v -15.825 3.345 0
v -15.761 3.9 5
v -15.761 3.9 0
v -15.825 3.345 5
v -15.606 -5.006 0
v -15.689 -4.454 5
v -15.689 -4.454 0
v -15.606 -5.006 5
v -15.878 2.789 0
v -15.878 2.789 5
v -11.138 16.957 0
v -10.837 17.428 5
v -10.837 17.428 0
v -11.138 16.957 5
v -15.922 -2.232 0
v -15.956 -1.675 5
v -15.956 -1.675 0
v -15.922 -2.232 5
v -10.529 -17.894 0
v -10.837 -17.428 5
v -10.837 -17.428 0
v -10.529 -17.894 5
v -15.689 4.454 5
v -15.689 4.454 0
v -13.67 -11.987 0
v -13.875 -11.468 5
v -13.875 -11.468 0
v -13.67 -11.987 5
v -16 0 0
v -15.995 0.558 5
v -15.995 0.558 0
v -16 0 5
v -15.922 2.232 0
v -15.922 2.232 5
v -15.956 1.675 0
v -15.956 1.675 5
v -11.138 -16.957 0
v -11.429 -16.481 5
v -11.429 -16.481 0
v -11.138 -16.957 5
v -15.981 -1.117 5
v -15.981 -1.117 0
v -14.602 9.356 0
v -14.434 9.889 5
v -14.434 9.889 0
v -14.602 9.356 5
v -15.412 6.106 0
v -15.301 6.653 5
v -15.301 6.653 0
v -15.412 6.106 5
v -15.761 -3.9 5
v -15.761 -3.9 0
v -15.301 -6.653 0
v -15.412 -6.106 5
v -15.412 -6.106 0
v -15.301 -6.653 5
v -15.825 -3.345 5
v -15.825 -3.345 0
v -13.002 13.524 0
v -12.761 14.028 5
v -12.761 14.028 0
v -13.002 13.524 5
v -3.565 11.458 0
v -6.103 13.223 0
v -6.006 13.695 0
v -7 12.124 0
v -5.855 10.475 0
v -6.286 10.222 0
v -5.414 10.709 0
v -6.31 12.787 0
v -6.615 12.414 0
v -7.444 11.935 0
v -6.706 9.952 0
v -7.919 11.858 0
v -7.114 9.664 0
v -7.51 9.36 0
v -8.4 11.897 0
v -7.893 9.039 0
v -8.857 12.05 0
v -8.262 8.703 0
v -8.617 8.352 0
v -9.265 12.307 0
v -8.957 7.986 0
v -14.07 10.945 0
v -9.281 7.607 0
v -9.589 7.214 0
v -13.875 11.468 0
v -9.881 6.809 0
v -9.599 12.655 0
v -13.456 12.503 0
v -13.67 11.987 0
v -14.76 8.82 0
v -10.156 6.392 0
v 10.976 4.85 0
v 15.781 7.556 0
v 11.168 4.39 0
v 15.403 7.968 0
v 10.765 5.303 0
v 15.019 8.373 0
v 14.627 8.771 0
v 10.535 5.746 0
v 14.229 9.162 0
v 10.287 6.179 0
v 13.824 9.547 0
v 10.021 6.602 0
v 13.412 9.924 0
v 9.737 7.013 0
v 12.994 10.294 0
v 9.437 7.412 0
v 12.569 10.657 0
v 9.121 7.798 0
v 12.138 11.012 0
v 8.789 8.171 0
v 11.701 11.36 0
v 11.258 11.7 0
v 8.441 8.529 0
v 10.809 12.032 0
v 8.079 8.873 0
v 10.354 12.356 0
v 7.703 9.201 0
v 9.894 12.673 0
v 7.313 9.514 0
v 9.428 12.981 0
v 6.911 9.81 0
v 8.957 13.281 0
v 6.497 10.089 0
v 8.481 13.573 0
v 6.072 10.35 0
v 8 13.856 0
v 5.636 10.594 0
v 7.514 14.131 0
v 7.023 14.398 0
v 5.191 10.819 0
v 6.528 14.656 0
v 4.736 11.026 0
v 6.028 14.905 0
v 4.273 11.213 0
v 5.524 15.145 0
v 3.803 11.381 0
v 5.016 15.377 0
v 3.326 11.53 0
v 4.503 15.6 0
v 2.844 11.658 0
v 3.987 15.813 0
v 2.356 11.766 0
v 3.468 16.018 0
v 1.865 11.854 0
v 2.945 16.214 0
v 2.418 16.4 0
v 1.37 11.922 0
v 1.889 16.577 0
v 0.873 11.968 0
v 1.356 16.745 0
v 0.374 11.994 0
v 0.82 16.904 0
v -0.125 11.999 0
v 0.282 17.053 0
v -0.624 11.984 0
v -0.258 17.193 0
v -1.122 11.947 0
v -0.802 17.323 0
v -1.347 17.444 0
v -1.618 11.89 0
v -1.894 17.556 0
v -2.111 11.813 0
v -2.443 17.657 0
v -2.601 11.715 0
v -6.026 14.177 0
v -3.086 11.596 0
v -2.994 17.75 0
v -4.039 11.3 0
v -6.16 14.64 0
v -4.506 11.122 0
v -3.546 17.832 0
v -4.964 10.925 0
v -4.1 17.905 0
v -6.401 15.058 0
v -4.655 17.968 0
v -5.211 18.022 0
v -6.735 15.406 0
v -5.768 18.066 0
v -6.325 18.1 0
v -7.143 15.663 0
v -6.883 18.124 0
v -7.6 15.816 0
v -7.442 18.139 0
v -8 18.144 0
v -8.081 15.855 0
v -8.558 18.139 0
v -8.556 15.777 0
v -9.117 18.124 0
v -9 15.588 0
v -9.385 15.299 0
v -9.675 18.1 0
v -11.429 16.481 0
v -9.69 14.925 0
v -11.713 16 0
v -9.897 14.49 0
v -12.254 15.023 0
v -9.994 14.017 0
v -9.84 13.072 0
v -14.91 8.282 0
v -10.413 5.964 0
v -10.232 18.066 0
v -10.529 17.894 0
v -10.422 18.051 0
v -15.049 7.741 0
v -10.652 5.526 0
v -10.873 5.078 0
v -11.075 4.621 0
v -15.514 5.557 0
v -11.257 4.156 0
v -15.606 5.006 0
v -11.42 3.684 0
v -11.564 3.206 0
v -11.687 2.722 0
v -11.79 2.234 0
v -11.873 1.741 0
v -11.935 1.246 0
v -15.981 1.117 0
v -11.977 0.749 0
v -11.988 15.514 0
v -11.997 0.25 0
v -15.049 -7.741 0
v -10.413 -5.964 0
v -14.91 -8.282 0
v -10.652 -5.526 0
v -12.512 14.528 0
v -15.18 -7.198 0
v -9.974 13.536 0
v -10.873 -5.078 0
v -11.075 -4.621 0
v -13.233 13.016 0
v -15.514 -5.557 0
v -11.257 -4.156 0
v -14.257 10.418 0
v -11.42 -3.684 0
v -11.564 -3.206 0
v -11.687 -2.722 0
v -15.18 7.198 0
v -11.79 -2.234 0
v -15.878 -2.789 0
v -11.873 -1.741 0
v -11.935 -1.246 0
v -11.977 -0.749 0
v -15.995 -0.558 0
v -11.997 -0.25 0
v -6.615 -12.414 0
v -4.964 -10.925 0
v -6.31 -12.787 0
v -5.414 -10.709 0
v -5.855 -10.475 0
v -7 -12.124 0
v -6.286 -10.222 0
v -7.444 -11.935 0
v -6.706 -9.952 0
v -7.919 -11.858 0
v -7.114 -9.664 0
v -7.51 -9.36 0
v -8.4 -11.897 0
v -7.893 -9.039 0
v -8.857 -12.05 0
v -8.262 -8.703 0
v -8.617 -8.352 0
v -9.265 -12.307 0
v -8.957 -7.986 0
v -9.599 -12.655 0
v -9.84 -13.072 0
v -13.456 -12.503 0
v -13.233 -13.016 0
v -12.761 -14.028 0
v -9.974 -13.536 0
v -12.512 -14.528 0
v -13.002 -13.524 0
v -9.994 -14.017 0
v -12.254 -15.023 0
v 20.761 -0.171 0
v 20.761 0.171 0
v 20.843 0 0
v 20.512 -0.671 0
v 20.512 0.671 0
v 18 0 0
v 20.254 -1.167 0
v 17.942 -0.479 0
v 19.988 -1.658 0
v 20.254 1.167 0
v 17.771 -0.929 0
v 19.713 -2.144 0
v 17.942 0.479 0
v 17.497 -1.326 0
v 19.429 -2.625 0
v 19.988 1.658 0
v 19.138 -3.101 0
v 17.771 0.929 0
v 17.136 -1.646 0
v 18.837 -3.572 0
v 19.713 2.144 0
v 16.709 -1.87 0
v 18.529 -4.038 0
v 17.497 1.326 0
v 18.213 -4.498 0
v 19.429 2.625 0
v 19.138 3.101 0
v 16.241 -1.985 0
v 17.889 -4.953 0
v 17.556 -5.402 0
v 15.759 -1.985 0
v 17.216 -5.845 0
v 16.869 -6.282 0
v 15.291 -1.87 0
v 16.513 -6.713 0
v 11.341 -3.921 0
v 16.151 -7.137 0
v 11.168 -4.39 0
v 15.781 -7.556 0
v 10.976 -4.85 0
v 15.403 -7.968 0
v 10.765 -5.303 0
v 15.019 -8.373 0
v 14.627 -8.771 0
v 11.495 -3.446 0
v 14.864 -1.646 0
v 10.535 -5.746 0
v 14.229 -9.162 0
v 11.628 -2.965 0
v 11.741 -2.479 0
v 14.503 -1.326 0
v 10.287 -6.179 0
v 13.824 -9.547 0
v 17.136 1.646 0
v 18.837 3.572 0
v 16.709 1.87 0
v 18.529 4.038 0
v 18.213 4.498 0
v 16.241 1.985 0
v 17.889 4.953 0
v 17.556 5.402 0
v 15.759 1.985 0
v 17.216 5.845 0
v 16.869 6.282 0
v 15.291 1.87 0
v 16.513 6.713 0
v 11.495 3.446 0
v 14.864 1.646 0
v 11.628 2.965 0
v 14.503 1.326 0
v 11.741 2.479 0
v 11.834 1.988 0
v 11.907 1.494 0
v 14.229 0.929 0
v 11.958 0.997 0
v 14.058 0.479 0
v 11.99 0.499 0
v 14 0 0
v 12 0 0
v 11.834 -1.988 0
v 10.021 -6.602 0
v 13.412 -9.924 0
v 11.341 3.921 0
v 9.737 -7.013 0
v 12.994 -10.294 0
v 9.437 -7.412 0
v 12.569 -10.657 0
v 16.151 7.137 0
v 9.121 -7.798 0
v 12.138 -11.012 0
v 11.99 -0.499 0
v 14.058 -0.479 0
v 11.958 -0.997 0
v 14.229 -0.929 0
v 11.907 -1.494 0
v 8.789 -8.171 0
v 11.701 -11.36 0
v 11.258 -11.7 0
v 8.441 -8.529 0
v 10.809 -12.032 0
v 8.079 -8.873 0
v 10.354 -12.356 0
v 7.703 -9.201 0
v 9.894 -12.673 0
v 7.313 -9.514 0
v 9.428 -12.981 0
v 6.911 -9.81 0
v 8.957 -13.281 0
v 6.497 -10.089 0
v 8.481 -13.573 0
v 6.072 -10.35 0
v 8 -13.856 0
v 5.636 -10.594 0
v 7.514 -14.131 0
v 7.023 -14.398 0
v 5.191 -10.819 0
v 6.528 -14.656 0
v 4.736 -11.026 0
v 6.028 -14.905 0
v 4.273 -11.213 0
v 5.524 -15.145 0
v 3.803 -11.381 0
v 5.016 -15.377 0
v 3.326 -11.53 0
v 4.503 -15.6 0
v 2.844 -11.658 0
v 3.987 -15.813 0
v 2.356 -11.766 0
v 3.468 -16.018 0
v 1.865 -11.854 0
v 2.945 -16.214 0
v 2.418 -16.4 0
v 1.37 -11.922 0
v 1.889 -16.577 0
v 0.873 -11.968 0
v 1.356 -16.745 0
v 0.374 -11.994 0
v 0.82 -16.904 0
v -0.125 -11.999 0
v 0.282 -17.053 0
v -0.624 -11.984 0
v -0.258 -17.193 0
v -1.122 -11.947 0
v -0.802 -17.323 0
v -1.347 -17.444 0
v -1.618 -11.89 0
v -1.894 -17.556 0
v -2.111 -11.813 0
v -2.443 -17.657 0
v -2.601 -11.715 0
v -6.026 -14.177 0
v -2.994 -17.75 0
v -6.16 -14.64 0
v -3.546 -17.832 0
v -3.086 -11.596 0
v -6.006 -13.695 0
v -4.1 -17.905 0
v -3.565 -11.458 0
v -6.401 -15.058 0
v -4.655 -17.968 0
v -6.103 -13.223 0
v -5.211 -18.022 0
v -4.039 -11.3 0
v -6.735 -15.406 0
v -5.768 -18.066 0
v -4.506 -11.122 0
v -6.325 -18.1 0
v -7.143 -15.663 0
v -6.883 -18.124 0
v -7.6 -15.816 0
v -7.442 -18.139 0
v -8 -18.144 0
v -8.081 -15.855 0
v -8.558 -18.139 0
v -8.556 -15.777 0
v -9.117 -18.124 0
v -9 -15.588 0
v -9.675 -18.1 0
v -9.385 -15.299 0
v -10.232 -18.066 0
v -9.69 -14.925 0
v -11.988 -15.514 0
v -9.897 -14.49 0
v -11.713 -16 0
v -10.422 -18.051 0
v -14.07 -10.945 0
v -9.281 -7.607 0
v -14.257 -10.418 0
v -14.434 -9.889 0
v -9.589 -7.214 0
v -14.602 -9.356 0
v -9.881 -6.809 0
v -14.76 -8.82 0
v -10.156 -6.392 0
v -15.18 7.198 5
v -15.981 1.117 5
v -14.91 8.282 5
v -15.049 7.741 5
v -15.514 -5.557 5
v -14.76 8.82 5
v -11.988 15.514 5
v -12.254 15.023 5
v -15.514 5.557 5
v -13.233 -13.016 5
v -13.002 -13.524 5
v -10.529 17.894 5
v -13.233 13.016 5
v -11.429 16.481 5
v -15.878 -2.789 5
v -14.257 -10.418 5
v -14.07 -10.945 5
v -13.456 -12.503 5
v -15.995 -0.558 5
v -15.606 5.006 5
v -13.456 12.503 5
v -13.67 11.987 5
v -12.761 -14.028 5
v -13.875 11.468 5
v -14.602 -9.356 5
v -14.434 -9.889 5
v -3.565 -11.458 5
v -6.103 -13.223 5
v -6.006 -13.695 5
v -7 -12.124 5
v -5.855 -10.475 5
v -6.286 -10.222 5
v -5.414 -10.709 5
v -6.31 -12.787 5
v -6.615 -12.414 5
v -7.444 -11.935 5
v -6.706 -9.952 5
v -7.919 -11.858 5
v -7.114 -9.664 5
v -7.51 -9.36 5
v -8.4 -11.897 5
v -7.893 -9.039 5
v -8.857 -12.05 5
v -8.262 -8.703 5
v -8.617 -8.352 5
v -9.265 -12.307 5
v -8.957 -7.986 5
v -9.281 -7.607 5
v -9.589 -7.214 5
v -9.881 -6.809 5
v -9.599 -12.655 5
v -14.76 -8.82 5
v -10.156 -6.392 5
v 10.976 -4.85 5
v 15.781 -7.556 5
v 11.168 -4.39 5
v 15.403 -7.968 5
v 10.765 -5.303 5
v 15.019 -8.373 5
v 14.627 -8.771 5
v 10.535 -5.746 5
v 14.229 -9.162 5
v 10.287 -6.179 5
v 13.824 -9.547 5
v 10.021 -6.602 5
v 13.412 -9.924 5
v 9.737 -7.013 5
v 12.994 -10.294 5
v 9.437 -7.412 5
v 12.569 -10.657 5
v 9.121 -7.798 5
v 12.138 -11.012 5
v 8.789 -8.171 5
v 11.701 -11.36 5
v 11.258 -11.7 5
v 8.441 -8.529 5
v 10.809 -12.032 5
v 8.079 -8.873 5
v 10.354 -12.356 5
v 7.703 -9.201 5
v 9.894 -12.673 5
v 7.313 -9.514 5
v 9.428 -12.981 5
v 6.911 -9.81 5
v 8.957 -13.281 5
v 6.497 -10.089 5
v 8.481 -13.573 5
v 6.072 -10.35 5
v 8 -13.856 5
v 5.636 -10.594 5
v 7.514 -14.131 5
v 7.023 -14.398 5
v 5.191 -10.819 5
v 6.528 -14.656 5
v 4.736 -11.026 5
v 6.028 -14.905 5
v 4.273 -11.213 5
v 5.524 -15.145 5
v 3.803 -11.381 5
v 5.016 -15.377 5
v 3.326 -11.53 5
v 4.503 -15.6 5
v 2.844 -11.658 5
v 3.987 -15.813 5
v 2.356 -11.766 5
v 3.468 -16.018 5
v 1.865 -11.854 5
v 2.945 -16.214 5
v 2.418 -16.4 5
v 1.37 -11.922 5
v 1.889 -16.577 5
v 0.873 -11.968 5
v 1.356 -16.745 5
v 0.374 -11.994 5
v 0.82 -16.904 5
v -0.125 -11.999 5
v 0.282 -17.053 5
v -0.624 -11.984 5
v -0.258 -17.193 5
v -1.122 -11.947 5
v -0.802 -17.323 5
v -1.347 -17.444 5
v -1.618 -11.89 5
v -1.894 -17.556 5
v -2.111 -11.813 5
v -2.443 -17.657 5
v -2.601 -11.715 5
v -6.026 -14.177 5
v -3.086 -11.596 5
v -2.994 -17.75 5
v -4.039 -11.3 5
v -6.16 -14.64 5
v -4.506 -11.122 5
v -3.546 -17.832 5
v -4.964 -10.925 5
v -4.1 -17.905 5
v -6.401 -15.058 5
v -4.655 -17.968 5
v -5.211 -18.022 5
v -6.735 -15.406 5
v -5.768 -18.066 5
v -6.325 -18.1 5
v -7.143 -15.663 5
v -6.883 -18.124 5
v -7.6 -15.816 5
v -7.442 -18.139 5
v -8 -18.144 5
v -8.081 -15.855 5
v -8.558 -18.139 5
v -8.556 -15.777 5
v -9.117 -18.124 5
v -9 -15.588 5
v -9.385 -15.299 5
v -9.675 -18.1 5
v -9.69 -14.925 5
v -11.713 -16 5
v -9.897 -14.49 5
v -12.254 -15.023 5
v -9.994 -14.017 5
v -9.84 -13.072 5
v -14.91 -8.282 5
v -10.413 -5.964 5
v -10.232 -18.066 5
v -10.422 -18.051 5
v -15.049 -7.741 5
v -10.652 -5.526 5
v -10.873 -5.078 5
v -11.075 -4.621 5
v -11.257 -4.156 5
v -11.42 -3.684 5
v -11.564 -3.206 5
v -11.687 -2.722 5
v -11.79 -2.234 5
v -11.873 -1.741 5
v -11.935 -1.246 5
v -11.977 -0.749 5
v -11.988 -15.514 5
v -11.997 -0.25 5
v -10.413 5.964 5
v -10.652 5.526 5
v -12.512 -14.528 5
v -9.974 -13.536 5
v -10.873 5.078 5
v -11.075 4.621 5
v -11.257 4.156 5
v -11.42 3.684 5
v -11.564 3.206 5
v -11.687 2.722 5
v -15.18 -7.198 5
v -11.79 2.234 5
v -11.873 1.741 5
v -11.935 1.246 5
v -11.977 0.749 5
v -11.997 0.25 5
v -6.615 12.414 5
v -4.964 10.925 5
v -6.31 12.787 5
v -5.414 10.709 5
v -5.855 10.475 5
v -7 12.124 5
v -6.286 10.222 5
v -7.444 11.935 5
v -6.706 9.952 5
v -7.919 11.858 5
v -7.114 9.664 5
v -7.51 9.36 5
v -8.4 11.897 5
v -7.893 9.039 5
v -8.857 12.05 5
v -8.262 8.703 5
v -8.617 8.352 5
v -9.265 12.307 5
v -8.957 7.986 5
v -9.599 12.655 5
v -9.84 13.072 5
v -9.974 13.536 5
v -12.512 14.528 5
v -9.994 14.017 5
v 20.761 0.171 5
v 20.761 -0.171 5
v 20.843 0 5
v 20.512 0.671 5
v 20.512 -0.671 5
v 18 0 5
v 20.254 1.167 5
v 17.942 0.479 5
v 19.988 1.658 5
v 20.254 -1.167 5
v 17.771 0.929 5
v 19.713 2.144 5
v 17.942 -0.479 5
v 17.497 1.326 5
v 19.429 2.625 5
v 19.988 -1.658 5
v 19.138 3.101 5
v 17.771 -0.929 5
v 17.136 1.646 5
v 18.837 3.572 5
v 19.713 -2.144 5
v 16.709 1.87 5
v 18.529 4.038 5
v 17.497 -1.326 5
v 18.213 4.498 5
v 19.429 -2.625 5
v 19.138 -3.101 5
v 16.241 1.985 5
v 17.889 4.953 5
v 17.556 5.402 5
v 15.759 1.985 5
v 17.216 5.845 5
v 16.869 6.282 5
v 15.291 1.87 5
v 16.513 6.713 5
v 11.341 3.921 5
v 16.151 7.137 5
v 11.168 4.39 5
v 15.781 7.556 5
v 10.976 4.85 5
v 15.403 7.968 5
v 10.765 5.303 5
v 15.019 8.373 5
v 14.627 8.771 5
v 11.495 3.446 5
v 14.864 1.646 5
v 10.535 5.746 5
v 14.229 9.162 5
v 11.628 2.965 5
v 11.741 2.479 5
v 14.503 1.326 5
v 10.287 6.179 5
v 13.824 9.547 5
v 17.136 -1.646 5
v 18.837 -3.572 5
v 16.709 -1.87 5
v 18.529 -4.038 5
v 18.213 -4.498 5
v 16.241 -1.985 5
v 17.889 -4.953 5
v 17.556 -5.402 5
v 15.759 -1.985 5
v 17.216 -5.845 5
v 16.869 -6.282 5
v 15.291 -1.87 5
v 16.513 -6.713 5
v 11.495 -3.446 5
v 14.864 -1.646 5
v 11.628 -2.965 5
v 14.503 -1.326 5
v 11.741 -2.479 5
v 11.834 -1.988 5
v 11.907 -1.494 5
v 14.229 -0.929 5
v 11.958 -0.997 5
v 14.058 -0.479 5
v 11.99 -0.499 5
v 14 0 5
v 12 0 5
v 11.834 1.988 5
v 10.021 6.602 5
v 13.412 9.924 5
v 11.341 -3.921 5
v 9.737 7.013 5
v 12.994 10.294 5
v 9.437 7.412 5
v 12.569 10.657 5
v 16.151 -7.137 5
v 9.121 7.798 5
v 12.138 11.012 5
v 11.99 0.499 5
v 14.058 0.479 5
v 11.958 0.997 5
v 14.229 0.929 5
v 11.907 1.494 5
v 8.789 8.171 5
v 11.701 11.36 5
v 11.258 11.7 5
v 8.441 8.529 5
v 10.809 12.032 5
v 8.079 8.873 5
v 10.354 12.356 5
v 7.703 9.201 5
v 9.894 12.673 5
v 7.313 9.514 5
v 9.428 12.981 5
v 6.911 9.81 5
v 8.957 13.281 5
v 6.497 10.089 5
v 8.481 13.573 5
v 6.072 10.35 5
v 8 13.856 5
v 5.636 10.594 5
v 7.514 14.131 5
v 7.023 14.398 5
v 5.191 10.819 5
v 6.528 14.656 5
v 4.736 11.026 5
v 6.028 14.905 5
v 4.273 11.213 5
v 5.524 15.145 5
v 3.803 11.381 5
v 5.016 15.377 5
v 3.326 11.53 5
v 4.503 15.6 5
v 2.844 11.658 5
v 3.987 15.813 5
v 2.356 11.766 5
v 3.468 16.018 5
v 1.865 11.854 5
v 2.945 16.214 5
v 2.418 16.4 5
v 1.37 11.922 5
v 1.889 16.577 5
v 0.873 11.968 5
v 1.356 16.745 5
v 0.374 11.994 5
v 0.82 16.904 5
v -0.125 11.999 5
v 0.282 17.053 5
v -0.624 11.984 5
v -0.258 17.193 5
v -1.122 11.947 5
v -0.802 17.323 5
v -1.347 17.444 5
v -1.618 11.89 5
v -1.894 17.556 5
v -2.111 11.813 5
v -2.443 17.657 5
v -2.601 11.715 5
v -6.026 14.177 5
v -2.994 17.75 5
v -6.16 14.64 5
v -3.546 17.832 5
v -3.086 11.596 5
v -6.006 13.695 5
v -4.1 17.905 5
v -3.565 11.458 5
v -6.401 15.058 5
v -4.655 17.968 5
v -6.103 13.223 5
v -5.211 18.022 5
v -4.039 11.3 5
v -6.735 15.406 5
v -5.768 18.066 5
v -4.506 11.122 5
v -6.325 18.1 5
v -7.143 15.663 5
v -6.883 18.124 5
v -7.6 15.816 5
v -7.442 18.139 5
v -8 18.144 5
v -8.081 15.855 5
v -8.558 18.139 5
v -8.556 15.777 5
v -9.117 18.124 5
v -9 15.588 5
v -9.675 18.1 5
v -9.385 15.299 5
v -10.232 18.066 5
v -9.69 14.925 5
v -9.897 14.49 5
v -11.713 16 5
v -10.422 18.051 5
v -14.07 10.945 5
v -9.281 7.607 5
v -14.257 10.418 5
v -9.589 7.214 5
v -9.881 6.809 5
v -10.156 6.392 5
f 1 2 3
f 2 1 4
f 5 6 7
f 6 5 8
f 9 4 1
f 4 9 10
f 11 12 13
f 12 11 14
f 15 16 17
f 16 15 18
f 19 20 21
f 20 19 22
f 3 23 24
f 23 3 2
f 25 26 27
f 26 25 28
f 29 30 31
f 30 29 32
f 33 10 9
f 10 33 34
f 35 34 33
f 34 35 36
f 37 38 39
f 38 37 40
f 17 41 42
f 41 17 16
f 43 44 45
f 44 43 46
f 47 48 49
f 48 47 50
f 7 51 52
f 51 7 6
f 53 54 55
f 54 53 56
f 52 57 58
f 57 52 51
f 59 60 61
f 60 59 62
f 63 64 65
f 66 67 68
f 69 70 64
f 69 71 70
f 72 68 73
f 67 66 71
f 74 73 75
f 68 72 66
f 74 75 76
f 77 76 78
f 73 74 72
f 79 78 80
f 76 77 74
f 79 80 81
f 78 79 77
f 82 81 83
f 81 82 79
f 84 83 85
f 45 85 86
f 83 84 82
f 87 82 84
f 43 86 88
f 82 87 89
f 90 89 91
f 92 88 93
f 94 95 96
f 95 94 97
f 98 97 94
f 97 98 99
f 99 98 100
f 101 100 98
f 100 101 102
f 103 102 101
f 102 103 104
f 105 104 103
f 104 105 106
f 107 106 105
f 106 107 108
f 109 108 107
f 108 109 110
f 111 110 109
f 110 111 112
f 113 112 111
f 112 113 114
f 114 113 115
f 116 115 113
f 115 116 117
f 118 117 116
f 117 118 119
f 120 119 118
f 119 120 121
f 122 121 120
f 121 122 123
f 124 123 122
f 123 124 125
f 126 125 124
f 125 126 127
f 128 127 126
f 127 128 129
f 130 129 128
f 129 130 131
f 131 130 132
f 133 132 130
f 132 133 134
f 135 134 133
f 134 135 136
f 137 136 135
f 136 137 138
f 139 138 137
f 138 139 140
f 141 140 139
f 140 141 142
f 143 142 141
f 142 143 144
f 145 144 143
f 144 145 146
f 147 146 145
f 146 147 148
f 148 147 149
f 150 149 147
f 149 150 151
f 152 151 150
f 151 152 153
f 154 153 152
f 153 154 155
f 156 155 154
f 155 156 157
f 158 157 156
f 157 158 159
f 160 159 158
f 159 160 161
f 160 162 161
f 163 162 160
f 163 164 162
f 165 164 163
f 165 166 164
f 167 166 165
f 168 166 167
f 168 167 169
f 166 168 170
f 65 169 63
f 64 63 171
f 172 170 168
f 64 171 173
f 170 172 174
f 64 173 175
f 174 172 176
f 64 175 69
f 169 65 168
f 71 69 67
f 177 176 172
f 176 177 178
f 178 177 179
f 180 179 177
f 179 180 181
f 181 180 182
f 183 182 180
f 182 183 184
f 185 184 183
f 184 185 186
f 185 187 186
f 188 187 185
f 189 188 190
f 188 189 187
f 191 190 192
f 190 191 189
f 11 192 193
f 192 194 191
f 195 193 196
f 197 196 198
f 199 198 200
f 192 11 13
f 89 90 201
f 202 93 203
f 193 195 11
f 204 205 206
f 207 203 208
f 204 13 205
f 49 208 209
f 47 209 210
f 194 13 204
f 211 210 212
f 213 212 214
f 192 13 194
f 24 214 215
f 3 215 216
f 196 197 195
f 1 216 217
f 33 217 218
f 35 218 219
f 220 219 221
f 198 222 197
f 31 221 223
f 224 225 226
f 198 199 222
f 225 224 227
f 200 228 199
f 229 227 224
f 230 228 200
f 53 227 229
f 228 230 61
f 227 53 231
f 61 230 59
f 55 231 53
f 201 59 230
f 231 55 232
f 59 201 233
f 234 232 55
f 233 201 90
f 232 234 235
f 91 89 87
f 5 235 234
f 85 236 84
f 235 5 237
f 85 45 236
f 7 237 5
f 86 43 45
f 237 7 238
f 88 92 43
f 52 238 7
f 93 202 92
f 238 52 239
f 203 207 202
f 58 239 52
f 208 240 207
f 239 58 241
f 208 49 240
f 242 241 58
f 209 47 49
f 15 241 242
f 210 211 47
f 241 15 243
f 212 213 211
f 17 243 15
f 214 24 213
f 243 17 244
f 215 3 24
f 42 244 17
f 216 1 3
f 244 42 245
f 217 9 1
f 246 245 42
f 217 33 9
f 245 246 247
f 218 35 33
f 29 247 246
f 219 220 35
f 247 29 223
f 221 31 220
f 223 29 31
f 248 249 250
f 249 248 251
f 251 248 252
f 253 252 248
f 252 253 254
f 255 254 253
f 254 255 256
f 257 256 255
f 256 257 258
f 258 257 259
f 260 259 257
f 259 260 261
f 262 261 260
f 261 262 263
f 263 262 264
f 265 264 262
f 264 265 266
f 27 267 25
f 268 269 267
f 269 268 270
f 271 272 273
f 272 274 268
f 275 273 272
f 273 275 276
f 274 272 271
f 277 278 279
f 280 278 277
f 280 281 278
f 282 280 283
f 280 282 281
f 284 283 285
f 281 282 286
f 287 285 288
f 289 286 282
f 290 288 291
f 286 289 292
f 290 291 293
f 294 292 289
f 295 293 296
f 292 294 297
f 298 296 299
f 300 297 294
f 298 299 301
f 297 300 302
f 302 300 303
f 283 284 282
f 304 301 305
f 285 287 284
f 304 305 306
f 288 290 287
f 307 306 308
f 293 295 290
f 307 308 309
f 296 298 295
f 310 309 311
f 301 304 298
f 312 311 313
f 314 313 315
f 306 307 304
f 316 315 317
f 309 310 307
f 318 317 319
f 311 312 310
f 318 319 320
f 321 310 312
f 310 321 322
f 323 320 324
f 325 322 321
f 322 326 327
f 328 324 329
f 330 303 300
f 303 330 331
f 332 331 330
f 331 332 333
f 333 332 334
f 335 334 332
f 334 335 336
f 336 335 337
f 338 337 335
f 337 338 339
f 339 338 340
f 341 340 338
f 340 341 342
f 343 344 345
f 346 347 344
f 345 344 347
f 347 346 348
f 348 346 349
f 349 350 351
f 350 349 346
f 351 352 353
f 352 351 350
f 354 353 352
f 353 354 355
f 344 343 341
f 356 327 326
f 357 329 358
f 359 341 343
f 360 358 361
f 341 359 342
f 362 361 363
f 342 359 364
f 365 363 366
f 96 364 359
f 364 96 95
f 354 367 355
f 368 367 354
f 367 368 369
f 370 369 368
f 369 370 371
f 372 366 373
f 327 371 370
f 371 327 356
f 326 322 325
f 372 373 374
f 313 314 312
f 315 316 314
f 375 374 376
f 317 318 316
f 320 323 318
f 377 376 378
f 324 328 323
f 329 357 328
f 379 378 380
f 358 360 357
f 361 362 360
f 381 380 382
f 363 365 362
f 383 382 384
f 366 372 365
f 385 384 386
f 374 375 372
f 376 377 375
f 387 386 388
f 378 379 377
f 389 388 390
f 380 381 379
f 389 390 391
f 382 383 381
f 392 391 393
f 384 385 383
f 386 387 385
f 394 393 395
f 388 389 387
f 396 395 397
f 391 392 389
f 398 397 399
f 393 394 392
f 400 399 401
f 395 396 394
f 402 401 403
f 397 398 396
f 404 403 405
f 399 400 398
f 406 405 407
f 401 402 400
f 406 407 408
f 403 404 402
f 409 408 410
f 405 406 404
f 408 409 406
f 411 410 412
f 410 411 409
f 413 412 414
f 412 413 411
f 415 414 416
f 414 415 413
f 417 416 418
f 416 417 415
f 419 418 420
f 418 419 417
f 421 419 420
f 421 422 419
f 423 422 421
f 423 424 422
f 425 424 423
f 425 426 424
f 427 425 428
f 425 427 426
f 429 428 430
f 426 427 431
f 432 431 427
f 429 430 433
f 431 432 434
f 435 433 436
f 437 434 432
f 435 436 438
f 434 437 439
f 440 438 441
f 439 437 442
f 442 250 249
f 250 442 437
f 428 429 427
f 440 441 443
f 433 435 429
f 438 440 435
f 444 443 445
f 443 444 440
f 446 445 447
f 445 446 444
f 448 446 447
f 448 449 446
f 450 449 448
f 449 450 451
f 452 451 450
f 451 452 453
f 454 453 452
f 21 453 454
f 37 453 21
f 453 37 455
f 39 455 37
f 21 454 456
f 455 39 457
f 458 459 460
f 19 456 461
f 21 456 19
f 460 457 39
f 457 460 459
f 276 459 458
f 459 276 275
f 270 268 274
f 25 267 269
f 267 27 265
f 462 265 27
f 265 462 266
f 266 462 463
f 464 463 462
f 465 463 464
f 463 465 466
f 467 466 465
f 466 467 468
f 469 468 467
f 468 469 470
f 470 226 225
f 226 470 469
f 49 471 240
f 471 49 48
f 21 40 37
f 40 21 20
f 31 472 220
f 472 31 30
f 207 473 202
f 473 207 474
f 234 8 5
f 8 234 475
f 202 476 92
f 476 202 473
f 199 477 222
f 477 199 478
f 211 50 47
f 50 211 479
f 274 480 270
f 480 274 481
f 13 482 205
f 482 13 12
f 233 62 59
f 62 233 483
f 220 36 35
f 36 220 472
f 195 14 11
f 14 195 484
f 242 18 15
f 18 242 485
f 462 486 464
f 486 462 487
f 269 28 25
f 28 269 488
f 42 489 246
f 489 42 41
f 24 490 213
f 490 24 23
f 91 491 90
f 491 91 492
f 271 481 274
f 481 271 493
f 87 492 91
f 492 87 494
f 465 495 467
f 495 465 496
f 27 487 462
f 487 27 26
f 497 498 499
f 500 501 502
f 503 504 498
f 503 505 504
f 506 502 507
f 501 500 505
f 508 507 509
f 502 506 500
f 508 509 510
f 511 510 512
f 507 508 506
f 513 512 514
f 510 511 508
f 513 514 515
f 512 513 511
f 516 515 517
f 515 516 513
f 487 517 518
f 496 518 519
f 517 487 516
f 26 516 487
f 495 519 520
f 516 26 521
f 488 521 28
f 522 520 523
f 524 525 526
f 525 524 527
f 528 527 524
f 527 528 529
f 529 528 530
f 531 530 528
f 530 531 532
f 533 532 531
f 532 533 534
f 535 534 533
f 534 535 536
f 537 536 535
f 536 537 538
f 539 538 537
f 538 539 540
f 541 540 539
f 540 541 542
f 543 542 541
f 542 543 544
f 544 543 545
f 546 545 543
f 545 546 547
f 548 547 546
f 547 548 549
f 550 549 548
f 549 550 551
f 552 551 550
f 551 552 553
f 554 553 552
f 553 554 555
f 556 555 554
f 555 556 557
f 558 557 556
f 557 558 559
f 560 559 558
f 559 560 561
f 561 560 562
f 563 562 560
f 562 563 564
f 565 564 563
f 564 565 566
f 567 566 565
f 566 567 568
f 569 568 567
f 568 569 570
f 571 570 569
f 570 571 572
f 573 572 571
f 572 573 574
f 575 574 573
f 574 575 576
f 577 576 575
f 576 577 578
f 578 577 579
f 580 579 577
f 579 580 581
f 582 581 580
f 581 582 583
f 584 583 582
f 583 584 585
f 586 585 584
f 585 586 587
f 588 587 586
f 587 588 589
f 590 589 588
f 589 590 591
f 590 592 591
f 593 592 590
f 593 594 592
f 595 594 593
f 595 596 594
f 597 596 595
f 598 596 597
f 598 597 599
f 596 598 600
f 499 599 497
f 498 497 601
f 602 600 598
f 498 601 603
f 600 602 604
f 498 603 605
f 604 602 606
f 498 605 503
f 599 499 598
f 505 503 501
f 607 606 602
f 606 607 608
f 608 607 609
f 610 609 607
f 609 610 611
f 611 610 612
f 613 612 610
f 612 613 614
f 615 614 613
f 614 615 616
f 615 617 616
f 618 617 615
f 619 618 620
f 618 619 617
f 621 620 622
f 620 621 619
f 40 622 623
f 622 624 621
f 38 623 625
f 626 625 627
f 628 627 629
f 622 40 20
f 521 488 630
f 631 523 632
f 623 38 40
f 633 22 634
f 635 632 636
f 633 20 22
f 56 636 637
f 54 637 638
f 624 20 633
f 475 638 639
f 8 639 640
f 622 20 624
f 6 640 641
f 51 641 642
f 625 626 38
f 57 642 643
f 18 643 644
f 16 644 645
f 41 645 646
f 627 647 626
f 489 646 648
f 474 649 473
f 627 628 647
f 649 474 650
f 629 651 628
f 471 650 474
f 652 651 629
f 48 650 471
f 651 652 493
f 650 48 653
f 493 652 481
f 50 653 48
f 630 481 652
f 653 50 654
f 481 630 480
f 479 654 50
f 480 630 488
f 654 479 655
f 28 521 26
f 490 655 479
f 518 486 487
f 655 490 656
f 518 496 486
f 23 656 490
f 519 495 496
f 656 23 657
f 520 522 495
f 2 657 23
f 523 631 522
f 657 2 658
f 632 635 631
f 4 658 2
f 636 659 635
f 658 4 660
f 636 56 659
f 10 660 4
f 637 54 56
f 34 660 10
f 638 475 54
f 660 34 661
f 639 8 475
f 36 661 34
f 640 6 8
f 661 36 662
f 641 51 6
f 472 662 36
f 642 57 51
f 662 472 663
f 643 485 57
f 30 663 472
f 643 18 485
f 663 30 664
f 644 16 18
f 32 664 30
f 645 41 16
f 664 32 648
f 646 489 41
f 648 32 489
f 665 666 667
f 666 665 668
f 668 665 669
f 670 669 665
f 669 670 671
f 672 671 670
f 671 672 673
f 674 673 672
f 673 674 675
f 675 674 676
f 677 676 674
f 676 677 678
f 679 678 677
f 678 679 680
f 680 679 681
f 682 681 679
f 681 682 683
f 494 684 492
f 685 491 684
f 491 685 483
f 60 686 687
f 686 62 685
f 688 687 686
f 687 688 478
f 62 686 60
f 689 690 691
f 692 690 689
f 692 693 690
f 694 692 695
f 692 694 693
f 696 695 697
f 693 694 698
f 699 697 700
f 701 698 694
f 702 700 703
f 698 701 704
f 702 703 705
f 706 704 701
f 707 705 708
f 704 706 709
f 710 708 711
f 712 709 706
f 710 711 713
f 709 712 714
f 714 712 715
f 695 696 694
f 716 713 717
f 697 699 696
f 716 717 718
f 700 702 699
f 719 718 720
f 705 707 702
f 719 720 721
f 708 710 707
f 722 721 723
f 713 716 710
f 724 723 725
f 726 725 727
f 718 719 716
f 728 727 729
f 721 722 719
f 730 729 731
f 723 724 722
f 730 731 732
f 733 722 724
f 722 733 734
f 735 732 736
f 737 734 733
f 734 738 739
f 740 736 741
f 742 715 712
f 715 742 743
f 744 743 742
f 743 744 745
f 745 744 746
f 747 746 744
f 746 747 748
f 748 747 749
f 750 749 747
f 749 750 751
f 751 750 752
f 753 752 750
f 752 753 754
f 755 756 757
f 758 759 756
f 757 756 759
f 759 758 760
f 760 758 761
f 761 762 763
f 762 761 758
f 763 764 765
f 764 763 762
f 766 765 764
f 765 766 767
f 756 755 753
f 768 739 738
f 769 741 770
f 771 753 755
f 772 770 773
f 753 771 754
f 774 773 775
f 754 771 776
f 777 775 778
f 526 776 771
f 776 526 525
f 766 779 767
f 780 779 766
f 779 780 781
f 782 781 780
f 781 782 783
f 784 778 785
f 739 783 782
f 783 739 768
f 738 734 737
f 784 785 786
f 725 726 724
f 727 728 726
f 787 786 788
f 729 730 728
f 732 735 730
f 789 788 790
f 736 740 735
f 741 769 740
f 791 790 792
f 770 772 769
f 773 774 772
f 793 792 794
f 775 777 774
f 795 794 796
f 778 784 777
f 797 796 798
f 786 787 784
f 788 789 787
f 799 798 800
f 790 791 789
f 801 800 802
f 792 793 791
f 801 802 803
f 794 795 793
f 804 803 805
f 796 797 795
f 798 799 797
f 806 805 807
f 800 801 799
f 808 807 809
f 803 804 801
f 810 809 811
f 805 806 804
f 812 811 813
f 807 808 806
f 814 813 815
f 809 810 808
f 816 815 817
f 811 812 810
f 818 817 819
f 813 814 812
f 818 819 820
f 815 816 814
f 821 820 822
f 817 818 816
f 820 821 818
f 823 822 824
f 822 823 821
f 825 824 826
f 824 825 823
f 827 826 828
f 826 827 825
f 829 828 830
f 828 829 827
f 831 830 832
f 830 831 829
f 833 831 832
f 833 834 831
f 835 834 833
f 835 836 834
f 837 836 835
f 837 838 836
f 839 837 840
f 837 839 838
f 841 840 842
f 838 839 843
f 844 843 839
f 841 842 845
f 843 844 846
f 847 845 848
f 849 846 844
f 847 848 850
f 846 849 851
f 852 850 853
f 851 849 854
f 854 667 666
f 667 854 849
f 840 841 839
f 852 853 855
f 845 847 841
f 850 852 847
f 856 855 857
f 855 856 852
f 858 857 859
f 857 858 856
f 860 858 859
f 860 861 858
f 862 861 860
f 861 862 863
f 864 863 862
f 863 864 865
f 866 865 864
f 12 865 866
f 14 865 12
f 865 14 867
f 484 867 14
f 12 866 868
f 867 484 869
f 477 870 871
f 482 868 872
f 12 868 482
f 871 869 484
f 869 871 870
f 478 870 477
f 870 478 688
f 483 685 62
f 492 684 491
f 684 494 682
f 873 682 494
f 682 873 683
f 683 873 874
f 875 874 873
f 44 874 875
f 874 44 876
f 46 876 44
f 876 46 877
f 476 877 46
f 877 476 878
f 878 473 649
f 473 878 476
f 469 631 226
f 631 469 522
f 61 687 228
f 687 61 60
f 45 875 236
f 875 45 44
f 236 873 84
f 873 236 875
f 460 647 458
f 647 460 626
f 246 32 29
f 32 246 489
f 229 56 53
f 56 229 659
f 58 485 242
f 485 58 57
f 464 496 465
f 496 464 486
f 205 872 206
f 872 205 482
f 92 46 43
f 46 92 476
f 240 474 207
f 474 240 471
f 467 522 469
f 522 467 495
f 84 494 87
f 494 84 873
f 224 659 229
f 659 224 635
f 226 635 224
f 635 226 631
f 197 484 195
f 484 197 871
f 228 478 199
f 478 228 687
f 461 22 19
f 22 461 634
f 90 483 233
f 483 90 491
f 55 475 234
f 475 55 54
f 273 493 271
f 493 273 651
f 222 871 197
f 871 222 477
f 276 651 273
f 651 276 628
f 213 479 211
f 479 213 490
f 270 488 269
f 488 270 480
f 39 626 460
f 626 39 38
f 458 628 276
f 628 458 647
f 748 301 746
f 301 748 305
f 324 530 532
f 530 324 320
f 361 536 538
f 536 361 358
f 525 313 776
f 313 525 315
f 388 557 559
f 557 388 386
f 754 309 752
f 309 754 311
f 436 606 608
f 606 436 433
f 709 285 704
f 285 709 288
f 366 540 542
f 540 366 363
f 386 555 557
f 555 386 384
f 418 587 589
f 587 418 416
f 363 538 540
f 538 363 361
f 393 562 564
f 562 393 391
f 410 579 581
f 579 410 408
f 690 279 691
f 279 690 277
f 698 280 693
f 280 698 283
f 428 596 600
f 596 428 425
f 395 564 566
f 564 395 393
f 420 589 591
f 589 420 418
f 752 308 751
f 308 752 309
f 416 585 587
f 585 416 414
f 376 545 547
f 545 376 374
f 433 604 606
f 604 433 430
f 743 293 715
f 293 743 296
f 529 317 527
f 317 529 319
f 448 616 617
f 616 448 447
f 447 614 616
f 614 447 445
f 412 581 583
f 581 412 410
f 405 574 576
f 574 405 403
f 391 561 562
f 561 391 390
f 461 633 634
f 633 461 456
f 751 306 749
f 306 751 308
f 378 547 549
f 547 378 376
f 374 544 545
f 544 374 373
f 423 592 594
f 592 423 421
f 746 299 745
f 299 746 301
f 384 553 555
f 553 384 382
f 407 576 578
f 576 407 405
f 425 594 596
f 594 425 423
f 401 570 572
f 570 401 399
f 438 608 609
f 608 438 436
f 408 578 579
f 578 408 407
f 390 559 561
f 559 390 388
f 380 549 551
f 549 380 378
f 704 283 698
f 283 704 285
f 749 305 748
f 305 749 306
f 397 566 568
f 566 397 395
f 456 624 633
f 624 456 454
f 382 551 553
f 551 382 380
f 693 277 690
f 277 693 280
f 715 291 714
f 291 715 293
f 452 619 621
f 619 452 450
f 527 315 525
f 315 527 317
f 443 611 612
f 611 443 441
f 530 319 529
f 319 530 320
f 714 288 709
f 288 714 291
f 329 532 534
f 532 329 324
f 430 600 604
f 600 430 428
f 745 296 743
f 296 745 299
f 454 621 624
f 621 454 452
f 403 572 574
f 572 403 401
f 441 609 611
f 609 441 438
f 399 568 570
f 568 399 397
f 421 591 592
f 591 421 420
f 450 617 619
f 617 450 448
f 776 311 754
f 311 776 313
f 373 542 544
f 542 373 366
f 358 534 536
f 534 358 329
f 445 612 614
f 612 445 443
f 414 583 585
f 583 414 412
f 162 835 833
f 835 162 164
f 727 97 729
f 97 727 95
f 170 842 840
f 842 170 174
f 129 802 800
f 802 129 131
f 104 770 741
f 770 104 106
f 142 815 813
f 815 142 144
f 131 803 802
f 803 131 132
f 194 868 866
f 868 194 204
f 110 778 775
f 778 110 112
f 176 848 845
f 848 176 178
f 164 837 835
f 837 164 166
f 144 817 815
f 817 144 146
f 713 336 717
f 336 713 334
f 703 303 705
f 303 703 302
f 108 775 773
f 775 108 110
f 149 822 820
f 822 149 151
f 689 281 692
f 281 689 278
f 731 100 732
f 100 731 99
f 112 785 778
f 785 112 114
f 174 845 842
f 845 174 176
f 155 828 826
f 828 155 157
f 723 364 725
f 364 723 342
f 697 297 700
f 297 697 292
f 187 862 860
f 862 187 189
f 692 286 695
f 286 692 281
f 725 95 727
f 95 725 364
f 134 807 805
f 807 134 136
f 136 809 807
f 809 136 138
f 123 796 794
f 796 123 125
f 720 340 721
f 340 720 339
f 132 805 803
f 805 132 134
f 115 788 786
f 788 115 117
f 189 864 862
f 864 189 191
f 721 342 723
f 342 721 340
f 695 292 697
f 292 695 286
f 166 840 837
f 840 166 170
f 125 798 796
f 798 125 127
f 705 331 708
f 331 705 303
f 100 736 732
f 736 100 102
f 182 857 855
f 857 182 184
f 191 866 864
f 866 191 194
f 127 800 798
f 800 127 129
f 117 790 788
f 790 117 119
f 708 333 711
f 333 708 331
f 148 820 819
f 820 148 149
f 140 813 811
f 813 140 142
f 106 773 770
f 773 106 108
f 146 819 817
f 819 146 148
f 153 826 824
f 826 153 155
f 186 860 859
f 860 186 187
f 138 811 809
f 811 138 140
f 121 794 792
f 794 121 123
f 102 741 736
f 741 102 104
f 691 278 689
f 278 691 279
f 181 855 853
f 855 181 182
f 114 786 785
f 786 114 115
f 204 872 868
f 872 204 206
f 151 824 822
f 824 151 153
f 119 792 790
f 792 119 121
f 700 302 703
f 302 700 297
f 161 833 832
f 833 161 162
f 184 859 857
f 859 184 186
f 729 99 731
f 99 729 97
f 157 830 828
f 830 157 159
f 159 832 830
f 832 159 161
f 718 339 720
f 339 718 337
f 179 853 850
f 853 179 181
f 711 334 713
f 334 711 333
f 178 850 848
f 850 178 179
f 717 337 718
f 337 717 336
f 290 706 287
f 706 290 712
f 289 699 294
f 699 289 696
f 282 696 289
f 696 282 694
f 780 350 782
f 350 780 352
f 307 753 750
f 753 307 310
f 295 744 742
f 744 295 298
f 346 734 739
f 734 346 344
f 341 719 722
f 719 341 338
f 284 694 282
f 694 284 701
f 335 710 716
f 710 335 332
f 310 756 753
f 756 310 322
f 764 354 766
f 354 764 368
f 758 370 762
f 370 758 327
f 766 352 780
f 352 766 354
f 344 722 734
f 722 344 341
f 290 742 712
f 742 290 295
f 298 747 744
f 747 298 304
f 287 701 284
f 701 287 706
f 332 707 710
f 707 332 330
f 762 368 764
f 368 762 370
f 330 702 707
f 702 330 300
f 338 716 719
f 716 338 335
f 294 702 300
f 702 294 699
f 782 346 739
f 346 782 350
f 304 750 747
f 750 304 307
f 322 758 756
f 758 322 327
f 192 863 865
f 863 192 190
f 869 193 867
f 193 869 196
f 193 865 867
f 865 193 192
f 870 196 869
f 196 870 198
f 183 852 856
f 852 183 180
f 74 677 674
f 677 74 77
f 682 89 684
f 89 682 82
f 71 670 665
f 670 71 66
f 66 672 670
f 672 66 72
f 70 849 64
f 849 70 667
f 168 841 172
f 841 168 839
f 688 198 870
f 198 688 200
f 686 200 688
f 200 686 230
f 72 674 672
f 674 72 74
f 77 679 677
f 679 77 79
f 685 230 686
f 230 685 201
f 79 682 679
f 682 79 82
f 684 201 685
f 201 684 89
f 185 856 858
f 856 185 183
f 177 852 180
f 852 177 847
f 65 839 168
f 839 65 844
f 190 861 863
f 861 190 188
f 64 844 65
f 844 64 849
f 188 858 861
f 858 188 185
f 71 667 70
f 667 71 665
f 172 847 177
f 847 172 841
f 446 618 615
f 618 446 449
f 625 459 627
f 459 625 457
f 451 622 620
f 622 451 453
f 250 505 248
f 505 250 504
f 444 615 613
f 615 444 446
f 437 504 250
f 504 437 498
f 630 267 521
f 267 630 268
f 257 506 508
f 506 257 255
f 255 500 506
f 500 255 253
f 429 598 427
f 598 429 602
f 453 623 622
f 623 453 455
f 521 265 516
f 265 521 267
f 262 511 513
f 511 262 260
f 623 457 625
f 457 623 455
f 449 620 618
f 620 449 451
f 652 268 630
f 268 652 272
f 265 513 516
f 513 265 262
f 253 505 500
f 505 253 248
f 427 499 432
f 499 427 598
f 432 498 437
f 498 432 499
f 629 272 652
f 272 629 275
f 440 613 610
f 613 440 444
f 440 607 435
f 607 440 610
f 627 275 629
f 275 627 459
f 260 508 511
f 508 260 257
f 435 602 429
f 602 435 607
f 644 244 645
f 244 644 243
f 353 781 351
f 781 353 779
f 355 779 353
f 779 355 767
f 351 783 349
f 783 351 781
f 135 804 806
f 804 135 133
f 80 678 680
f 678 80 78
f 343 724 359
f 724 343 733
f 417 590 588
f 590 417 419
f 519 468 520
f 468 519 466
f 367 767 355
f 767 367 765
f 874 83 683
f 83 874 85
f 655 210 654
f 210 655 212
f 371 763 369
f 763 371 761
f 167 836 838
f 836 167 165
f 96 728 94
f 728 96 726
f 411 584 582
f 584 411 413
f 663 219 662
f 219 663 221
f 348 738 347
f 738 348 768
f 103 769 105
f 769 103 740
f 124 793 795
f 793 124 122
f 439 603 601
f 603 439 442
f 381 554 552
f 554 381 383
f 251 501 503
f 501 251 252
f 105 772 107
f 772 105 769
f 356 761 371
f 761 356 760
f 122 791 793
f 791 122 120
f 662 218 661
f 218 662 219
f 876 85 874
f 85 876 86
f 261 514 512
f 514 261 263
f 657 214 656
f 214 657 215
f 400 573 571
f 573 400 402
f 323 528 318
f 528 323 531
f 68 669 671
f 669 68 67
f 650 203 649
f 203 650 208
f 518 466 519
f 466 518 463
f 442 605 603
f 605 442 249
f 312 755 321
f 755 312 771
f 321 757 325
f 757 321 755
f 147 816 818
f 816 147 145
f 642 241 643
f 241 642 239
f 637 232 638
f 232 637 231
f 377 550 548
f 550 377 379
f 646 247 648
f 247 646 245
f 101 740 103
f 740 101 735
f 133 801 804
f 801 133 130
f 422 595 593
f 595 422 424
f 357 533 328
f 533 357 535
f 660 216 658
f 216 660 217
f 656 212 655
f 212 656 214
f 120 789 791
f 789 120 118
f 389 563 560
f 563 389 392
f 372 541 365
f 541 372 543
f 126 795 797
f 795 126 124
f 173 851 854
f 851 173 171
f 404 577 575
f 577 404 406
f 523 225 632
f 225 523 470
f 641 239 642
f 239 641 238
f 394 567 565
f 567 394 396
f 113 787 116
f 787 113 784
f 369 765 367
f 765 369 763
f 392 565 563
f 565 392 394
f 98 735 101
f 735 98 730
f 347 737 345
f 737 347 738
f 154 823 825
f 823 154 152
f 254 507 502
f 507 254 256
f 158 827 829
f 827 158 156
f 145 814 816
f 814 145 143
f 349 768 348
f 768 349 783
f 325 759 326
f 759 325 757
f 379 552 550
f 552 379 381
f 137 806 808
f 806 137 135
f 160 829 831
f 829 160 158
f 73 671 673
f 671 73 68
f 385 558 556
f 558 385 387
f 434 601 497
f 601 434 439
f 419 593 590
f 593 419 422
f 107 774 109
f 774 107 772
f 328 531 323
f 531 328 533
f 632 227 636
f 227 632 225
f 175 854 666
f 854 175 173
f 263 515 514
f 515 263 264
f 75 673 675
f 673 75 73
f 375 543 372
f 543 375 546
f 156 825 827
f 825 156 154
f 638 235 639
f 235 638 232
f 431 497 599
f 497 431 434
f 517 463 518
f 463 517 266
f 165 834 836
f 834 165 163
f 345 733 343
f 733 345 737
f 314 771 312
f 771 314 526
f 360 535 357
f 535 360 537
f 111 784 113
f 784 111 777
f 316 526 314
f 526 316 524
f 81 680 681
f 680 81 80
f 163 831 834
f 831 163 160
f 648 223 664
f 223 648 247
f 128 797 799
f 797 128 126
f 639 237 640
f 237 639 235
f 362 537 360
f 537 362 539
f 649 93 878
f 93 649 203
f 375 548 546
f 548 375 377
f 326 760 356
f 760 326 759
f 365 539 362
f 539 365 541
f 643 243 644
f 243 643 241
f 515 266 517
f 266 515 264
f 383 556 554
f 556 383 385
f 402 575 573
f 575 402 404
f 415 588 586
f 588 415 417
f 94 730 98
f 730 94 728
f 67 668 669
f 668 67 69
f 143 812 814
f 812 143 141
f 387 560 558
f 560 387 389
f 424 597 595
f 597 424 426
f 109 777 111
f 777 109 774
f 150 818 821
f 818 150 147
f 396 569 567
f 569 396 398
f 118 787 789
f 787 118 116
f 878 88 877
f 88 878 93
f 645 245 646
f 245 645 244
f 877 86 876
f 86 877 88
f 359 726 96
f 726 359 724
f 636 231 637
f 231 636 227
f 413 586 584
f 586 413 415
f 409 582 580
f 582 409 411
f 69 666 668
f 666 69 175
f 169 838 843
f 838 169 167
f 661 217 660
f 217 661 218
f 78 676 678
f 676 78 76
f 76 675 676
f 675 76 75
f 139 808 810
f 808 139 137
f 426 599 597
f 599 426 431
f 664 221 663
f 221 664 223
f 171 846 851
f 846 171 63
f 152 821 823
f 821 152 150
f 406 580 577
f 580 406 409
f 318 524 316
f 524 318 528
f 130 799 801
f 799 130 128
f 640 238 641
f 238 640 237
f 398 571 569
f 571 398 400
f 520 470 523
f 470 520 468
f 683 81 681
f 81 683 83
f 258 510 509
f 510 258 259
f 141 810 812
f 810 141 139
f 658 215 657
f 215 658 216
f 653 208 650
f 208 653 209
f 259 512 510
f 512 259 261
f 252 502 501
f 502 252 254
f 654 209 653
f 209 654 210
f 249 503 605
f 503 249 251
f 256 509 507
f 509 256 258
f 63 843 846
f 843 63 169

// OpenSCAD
$fa=1/1;
$fs=0.5/1;

main_diameter=32;	//[32:50]
keyring_thickness=5;	//[2:0.5:10]
large_hole_diameter=24;	//[0:24]
small_hole_diameter=4;	//[4:0.2:6]


		difference ()										// removing holes from triangle
		{
			intersection_for(a=[0:120:359])						// intersection of 3 cylinders creating reuleaux triangle
			{
				rotate([0,0,a])
					translate([main_diameter/2,0,0])
						cylinder(r=main_diameter,h=keyring_thickness);
			};
			union()										// large & small holes
			{
				translate ([0,0,-1])
					cylinder(r=large_hole_diameter/2,h=keyring_thickness+2) ;			// large hole
				for(b=[0:120:359])							// 3 small holes
				{
					rotate([0,0,b])
						translate([main_diameter/2,0,-1])
							cylinder(r=small_hole_diameter/2,h=30);
				};
			};
		};
	


// designed and uploaded to Thingiverse by brianbutterfield (Daniel Rutterford) June 2015
